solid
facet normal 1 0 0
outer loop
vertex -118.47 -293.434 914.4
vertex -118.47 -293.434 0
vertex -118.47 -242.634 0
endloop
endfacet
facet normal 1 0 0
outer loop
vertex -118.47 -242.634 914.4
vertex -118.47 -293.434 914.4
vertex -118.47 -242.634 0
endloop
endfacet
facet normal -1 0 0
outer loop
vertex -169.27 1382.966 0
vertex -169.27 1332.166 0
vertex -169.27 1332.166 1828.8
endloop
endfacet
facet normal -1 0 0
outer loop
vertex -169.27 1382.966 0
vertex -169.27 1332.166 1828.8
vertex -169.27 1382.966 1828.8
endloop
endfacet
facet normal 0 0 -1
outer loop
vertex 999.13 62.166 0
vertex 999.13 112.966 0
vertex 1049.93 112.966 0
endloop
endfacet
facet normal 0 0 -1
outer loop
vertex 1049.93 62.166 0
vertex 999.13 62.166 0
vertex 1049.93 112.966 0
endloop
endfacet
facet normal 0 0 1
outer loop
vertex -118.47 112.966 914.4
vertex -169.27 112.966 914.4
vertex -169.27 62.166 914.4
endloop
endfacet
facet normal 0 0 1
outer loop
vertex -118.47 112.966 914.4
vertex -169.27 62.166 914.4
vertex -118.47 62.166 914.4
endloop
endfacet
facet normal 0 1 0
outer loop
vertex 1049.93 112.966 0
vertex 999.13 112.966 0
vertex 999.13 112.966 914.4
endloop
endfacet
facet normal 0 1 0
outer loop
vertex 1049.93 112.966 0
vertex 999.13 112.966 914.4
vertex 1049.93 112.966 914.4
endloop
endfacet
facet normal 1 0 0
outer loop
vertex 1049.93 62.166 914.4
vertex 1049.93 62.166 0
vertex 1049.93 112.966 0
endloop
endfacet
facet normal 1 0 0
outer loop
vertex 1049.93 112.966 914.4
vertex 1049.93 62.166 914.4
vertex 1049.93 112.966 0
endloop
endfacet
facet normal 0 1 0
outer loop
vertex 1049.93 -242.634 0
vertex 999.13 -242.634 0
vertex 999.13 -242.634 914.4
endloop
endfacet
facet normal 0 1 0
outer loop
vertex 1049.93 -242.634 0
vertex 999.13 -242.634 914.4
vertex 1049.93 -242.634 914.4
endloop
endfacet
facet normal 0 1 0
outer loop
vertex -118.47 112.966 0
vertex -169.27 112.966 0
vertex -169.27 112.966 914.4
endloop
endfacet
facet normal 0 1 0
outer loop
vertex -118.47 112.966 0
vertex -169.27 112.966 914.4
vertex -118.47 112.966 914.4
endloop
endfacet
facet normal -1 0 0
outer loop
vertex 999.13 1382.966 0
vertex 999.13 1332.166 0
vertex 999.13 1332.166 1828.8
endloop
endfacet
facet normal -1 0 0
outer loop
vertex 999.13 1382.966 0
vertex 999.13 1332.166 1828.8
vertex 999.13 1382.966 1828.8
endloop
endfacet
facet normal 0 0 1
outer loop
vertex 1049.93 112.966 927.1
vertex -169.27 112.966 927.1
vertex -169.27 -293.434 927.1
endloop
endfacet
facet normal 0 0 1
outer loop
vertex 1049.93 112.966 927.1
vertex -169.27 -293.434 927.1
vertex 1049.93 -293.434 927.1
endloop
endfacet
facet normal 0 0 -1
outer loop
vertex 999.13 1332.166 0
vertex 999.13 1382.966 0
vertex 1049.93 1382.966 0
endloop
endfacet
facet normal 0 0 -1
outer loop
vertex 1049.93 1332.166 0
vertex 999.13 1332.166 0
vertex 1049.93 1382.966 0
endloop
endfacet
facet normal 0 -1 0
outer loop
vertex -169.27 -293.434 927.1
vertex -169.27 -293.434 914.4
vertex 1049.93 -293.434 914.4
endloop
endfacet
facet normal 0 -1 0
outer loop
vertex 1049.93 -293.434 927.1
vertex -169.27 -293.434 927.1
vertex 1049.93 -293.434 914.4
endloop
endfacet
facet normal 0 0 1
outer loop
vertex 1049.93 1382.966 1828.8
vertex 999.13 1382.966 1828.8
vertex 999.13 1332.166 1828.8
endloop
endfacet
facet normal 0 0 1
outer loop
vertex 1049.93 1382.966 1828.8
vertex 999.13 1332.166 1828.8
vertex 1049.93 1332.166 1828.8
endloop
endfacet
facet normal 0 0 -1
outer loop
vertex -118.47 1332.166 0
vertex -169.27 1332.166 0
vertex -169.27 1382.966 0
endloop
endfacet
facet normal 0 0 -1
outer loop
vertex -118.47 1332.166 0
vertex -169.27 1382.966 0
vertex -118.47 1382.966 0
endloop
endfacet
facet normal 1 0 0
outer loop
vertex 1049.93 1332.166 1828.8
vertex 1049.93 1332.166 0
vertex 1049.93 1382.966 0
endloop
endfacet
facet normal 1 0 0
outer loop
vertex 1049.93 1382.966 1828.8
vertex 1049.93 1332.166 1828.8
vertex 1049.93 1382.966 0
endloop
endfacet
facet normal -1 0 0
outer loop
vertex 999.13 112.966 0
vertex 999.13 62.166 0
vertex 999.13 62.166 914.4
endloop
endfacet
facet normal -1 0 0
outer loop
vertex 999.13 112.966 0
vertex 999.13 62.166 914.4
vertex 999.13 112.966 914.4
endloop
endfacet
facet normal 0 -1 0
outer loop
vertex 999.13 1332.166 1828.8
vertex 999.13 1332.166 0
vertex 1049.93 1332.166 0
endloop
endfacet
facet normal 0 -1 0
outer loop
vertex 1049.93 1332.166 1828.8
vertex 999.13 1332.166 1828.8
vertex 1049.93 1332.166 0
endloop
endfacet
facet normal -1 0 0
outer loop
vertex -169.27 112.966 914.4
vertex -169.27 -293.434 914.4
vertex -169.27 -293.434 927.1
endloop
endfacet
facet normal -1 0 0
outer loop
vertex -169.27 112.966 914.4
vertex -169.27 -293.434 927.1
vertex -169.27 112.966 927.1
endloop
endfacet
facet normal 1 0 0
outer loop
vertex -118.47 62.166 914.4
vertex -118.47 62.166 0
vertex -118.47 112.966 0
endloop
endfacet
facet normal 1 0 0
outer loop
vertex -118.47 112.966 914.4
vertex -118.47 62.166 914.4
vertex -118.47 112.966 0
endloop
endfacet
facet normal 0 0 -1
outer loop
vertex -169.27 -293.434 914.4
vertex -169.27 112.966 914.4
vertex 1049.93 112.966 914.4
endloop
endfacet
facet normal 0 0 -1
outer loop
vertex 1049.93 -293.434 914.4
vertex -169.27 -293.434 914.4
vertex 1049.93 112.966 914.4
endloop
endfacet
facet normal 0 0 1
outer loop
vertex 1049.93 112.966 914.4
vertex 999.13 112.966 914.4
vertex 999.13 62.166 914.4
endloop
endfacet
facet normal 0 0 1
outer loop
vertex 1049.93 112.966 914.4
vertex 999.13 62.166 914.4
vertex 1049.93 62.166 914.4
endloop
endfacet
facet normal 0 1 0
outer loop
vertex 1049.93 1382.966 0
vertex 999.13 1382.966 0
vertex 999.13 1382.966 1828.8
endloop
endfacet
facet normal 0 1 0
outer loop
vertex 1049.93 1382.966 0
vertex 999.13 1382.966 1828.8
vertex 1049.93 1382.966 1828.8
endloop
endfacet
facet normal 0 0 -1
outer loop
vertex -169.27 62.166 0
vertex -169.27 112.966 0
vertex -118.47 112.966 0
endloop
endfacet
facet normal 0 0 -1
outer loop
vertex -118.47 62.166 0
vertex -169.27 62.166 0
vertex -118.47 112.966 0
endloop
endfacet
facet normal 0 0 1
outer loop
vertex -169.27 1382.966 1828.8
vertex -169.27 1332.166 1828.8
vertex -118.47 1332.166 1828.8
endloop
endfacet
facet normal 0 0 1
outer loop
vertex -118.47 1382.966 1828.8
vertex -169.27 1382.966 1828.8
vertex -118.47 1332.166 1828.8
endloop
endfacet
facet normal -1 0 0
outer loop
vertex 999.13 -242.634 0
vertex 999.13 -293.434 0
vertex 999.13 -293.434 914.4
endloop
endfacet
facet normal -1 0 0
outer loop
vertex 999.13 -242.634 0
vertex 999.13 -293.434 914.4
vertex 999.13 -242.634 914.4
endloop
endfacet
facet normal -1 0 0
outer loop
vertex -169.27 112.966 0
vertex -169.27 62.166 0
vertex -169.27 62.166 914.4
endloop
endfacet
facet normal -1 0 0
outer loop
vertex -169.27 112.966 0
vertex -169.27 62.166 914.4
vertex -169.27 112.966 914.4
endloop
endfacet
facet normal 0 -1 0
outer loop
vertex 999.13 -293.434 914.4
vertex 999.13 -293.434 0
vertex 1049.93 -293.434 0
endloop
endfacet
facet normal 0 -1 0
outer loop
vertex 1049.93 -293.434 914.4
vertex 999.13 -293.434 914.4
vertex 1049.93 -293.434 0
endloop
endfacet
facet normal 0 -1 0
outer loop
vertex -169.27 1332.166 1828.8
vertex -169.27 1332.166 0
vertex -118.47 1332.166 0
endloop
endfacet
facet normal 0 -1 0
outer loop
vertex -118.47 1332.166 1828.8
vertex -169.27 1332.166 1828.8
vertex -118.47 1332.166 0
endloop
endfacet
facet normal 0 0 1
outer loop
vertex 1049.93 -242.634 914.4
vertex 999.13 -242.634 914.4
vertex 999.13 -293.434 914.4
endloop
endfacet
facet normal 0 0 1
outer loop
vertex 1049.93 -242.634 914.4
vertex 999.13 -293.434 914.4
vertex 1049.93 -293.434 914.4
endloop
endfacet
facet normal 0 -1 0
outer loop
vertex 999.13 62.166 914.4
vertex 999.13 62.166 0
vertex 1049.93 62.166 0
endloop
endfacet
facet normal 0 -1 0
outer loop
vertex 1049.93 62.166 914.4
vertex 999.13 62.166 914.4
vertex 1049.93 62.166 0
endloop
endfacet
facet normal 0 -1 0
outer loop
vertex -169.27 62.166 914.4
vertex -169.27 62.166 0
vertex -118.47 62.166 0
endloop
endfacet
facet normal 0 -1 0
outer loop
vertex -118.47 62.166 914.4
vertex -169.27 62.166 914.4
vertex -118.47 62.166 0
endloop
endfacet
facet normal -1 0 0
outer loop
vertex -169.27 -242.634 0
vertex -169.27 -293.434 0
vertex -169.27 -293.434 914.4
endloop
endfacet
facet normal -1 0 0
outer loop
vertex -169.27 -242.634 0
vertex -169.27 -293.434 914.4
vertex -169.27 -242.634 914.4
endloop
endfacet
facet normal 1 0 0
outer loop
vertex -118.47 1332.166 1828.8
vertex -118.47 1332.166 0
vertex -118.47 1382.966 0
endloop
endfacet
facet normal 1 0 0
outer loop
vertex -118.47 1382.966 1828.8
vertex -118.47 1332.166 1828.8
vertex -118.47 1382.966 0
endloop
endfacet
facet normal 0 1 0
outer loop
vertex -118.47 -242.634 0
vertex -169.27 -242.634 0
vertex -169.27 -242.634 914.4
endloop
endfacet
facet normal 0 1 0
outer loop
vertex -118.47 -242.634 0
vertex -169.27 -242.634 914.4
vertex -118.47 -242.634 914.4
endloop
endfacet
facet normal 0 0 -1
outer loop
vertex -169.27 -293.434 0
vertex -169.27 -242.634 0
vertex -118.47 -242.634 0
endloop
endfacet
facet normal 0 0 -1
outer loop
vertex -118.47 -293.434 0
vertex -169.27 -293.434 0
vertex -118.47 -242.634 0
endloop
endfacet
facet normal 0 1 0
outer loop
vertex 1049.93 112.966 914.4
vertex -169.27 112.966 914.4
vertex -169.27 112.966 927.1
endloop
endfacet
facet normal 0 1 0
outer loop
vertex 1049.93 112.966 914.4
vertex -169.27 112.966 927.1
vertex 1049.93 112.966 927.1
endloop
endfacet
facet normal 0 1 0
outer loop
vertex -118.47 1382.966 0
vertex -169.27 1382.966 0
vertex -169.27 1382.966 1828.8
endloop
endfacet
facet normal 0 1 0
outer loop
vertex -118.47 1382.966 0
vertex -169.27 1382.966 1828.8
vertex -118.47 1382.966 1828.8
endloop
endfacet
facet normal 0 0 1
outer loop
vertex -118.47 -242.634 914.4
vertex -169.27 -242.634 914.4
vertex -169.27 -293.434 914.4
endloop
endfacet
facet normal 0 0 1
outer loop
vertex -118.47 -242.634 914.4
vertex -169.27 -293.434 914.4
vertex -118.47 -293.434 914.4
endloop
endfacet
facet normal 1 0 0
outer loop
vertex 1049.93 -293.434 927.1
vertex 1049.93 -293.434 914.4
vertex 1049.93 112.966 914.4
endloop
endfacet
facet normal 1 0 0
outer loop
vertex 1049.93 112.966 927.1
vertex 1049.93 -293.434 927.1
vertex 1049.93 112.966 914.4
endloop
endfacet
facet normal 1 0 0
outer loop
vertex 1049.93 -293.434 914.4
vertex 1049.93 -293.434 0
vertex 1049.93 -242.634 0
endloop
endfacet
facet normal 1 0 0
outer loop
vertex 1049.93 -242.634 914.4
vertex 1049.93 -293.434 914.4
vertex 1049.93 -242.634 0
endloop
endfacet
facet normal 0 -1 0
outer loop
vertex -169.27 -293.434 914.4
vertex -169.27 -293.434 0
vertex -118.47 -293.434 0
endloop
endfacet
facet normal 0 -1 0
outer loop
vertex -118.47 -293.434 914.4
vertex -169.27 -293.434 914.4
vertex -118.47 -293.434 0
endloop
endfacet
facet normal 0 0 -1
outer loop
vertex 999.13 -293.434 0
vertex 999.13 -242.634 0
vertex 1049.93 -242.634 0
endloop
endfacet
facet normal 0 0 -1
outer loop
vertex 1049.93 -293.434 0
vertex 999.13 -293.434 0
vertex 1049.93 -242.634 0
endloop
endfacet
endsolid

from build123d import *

# Parameters (mm, degrees)
F0_W     = 50.8
F0_H     = 50.8
F1_DEPTH = 914.4
F2_W     = 1219.2
F2_H     = 406.4
F3_DEPTH = 12.7
F4_DEPTH = 1828.8


with BuildPart() as f1:
    # F0 (on Top) → F1 (new body)
    with BuildSketch(Plane.XY):
        with Locations((-143.86965, 87.566311)):
            Rectangle(F0_W, F0_H)
        with Locations((1024.53035, 87.566311)):
            Rectangle(F0_W, F0_H)
        with Locations((-143.86965, -268.033689)):
            Rectangle(F0_W, F0_H)
        with Locations((1024.53035, -268.033689)):
            Rectangle(F0_W, F0_H)
    extrude(amount=F1_DEPTH)


with BuildPart() as f3:
    # F2 (on face) → F3 (new body)
    with BuildSketch(Plane.XY.offset(914.4)):
        with Locations((440.33035, -90.233689)):
            Rectangle(F2_W, F2_H)
    extrude(amount=F3_DEPTH)


with BuildPart() as f4:
    # F0 (on Top) → F4 (new body)
    with BuildSketch(Plane.XY):
        with Locations((-143.86965, 1357.566311)):
            Rectangle(F0_W, F0_H)
        with Locations((1024.53035, 1357.566311)):
            Rectangle(F0_W, F0_H)
    extrude(amount=F4_DEPTH)


solid = Compound([f1.part, f3.part, f4.part])
